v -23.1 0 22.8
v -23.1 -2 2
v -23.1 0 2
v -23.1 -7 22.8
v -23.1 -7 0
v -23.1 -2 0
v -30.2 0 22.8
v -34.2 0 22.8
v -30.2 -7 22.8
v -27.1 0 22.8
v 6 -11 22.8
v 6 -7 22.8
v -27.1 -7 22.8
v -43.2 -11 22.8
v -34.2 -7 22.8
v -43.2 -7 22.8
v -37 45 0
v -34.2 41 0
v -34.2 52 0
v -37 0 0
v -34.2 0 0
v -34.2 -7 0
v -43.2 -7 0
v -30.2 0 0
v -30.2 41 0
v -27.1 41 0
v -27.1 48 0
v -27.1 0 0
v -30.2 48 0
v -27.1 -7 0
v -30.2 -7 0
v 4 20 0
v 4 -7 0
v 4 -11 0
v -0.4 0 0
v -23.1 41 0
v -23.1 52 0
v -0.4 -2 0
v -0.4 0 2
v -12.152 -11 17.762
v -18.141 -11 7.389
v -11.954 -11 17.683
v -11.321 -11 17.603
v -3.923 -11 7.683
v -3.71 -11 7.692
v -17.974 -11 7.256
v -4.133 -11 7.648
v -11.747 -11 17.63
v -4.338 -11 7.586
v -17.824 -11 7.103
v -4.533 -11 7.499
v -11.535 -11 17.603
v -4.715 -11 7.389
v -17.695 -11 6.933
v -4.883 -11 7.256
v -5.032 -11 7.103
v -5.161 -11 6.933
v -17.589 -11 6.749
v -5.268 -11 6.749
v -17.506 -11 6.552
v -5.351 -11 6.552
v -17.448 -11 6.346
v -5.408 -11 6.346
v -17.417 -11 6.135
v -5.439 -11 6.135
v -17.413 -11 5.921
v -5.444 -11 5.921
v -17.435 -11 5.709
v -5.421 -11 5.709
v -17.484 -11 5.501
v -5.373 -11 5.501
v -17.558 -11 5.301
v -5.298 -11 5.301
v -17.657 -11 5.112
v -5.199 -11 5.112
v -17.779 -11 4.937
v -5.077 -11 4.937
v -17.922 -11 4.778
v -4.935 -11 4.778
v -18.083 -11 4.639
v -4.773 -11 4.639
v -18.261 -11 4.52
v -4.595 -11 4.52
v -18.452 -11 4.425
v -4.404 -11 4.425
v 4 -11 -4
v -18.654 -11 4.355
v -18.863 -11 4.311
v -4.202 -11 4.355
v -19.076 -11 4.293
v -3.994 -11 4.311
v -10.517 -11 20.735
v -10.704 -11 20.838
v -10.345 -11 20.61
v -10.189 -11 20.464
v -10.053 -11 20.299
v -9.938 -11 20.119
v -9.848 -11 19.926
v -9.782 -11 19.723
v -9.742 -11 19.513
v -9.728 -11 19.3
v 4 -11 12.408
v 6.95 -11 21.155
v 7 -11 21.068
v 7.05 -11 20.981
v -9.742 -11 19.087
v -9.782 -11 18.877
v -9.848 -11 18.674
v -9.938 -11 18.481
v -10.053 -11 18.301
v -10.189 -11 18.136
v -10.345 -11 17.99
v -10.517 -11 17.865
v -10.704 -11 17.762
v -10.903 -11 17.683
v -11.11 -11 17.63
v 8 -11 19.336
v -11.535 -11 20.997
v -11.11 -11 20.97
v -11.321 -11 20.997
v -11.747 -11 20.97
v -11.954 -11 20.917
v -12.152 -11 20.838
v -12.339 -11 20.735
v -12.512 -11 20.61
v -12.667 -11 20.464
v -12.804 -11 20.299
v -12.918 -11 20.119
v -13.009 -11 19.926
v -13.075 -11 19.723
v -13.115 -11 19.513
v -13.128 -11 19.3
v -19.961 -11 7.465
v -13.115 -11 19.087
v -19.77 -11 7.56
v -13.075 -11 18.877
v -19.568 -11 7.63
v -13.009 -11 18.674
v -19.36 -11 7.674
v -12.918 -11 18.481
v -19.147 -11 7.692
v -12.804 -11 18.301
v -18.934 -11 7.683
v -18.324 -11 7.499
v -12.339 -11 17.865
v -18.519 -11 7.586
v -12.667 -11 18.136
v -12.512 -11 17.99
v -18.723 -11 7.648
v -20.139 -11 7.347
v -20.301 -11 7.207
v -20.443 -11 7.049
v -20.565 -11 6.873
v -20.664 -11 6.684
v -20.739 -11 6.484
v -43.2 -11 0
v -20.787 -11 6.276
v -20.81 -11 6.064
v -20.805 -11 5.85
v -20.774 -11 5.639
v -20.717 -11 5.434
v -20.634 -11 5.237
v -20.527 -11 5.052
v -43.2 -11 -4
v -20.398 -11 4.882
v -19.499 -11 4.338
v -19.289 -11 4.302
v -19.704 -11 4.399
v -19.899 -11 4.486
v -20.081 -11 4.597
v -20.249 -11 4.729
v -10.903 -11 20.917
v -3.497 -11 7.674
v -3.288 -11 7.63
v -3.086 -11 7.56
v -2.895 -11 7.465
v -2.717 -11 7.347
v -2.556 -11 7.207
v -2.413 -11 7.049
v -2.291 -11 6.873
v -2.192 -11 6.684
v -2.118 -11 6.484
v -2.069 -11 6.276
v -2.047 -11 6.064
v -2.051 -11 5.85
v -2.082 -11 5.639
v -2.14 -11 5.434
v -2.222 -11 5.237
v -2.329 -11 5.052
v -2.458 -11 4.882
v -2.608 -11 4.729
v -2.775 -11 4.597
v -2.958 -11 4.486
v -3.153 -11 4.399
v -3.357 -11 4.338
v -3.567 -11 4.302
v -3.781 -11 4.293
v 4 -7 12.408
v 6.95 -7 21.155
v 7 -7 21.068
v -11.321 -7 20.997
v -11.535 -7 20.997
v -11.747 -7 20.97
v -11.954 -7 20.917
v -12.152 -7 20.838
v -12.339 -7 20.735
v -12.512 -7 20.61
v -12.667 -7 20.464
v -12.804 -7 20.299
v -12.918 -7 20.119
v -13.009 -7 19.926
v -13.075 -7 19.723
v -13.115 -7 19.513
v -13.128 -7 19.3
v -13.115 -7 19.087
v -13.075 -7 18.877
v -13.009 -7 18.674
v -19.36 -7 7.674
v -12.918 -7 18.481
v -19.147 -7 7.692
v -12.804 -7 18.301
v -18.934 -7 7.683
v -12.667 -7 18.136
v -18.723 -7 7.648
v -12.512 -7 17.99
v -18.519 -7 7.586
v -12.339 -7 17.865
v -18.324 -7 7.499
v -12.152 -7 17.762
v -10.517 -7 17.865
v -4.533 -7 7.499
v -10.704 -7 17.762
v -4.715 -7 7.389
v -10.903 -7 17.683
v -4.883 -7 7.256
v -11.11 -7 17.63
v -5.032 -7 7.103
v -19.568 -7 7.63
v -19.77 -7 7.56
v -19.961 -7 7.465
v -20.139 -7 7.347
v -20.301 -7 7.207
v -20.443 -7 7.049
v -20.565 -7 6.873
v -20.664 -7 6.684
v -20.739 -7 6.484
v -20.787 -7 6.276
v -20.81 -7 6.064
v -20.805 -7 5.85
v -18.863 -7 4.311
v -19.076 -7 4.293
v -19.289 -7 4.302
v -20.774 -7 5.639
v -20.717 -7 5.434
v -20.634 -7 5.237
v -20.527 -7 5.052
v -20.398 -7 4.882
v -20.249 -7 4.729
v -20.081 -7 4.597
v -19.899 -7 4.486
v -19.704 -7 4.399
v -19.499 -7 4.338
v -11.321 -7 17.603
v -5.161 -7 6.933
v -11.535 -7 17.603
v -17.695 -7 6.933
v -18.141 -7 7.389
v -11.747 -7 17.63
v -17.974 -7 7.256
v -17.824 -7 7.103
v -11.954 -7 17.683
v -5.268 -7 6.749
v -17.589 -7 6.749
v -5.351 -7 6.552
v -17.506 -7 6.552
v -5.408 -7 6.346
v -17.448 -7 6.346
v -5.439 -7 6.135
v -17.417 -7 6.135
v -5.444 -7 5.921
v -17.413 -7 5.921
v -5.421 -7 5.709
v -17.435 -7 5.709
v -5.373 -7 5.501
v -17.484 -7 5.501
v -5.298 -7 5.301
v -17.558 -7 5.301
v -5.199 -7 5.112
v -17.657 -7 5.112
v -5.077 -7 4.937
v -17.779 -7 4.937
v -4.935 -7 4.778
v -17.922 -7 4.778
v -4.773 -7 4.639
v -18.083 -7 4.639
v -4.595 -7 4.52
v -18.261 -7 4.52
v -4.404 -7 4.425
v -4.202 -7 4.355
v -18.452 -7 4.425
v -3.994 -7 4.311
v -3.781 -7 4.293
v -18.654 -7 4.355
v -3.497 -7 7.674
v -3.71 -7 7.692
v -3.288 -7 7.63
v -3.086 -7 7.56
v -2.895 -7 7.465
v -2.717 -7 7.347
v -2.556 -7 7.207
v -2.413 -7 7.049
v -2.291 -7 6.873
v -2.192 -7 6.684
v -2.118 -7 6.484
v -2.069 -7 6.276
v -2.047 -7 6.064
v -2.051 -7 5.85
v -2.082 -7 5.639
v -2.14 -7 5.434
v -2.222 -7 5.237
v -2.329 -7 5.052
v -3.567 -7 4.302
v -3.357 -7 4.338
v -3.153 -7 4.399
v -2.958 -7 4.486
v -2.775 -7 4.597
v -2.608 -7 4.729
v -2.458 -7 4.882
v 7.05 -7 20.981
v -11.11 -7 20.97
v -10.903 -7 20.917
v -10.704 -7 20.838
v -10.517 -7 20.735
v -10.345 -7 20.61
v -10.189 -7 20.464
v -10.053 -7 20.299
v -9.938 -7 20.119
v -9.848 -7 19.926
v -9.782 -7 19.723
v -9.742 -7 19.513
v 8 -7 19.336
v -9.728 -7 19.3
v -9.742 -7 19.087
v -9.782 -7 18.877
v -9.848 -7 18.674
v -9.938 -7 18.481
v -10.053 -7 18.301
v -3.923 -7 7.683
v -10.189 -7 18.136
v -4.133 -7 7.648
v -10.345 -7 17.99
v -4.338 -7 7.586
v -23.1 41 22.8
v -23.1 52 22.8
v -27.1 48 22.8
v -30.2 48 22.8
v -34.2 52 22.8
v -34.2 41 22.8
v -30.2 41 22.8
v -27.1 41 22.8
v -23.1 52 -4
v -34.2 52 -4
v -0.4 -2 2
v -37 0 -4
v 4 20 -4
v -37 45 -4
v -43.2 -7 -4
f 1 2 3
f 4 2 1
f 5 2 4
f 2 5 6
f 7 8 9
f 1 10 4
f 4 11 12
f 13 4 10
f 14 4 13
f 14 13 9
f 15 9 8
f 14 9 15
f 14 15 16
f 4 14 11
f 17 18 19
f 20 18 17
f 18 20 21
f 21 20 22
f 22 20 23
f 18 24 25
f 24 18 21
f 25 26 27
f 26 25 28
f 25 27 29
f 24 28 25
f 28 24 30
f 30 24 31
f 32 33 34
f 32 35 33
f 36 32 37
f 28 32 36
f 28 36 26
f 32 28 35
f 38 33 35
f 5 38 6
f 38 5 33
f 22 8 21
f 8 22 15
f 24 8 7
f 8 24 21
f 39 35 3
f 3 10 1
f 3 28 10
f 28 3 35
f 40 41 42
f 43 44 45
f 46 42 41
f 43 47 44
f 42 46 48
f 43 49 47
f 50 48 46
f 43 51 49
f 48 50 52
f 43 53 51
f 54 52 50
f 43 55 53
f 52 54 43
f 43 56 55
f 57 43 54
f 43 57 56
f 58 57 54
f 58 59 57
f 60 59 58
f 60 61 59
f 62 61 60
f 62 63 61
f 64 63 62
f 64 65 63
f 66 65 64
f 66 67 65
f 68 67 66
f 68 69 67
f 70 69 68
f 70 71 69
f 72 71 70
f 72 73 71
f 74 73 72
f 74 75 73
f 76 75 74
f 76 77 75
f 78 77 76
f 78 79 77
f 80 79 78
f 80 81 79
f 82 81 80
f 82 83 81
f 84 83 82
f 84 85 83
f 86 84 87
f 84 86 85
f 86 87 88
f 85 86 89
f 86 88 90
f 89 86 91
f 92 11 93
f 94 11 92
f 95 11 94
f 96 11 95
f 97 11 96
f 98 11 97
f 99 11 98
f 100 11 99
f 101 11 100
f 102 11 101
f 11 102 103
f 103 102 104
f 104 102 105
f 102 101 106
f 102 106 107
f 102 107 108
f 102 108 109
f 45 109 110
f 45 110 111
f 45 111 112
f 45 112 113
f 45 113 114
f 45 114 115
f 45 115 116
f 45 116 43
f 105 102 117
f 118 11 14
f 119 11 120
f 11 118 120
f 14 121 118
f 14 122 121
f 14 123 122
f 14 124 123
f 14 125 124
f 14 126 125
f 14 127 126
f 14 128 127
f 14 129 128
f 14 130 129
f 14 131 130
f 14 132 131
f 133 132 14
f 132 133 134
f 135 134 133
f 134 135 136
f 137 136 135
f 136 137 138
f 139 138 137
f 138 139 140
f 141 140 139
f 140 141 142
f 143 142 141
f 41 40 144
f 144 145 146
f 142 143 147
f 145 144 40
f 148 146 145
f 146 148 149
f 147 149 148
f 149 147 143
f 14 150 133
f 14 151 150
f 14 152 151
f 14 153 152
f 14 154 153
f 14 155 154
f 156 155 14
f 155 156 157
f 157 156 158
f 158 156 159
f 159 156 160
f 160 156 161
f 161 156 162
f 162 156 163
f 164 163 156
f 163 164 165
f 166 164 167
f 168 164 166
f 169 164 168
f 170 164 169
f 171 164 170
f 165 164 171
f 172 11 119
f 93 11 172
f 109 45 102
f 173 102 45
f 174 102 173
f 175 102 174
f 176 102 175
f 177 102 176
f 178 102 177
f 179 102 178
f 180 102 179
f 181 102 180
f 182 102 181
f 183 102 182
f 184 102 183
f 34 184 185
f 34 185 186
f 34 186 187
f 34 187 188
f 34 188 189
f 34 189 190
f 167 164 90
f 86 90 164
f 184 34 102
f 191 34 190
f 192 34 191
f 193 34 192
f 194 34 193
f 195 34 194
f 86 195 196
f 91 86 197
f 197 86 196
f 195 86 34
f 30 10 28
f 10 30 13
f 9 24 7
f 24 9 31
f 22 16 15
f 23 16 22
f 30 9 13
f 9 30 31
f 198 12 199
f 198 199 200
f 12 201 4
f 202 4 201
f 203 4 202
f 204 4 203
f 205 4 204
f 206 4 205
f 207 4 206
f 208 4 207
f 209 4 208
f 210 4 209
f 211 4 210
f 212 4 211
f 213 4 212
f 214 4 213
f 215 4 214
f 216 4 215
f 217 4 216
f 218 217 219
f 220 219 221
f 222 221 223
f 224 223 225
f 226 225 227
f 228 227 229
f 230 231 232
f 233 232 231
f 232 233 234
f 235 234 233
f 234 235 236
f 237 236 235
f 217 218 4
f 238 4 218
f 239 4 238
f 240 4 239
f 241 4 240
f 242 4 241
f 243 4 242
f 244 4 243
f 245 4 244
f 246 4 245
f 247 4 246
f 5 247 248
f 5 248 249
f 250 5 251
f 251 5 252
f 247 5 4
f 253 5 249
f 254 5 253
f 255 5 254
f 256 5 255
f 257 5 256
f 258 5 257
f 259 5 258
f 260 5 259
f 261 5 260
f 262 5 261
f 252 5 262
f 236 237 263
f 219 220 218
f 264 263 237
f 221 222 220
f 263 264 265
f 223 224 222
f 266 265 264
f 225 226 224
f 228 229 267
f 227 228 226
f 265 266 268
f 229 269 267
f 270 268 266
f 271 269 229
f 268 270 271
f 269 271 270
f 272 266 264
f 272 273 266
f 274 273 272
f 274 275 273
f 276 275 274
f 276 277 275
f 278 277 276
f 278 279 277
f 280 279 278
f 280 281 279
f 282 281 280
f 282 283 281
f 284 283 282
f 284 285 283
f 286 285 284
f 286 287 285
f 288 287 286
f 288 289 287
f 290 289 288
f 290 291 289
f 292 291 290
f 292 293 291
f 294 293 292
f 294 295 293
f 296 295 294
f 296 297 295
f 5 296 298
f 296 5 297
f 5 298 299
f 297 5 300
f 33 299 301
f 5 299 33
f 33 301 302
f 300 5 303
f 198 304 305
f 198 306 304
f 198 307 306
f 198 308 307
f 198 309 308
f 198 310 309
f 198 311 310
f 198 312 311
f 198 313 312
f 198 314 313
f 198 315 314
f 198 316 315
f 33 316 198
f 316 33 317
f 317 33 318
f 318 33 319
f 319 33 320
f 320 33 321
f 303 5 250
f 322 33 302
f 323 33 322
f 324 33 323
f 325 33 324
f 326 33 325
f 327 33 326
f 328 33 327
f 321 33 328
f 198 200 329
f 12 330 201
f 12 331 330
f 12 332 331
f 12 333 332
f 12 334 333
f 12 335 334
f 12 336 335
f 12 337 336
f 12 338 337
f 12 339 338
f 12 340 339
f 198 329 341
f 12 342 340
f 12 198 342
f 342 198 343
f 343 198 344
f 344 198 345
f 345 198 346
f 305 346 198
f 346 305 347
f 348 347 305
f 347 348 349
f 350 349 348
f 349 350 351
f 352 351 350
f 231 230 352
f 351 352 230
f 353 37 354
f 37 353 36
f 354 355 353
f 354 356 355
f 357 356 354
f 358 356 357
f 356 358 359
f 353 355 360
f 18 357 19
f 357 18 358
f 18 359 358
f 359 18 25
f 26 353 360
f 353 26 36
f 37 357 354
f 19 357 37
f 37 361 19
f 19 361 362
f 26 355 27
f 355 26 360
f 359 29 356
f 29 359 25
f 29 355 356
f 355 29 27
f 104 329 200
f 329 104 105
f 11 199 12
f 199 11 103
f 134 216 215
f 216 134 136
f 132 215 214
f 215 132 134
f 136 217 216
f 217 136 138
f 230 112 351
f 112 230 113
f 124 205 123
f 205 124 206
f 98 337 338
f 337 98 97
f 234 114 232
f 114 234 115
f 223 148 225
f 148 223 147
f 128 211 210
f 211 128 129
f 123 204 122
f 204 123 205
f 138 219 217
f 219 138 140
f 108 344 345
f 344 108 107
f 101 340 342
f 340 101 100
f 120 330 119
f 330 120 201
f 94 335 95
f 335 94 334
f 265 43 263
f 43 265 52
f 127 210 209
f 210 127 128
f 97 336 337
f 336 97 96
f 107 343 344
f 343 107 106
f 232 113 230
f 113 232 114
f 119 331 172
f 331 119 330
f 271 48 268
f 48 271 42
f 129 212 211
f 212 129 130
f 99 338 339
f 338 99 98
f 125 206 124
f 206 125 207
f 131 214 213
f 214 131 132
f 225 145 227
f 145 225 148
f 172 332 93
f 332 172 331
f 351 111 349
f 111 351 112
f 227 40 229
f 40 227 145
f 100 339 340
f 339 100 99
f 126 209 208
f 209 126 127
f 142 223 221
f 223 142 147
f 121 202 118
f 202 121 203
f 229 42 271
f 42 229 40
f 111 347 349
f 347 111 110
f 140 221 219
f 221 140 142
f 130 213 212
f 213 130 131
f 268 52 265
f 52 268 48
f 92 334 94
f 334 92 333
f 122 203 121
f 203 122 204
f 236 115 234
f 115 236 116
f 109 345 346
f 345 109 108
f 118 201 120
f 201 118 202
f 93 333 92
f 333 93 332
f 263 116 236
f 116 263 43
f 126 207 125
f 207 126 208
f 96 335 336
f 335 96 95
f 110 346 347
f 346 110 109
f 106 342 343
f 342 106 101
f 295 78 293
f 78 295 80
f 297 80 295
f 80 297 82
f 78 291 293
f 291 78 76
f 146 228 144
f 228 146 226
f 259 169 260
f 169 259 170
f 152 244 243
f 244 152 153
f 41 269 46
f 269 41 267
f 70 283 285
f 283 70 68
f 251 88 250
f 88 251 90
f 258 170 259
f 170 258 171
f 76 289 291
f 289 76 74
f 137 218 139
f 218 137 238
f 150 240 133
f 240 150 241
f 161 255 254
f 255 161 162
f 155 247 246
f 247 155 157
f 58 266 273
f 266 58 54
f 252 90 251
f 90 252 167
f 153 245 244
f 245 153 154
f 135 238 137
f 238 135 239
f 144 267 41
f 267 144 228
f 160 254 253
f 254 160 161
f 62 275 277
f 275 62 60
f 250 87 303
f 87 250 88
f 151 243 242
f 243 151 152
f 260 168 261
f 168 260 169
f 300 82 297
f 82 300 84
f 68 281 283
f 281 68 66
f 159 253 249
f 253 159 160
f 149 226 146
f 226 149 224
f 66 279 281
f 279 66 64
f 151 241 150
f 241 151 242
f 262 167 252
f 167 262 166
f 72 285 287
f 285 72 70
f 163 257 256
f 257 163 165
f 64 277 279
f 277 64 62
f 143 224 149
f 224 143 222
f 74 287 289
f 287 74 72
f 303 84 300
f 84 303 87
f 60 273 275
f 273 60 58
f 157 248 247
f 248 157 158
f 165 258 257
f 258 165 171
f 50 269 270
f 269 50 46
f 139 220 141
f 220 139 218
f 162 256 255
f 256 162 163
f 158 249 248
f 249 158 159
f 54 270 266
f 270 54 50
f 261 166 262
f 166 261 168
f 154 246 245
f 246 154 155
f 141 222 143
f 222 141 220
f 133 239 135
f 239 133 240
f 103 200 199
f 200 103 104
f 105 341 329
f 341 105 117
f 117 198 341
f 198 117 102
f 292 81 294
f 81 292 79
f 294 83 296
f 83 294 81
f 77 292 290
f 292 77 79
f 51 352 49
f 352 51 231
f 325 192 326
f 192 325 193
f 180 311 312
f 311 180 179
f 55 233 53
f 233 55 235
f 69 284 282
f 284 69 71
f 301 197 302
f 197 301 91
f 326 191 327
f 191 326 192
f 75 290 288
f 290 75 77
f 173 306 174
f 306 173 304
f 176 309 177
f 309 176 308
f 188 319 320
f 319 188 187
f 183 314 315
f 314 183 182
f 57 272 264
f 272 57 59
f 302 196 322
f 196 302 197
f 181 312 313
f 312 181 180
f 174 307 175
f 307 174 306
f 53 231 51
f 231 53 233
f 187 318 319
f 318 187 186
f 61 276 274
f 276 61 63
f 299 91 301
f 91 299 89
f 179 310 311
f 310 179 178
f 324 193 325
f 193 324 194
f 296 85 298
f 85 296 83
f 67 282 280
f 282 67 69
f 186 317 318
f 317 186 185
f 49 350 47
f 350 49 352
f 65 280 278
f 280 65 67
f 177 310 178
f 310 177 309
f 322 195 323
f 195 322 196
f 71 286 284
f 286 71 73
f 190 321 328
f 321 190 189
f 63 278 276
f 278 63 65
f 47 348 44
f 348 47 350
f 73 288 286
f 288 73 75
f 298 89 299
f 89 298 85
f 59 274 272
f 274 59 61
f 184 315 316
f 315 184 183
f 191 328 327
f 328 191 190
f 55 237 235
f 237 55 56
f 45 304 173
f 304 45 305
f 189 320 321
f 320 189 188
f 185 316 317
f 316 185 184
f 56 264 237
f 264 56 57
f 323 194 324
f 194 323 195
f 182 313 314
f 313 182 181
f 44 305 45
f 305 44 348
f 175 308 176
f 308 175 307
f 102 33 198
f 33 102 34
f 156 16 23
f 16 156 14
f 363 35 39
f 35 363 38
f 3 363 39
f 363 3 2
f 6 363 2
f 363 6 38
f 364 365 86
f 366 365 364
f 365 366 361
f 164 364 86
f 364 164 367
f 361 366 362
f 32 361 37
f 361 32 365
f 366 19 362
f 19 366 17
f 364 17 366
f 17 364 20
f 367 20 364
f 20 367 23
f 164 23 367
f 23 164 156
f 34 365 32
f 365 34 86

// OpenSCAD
// file: triangle_truss.scad
module truss_edge_beam(beam_width, edge_extrude, total_length)
{
  edge_width = beam_width * tan(60);
  edge_bevel = beam_width / (2 * cos(60));
  bevel_x = edge_bevel - (1 + $epsilon) * beam_width * cos(60) / 2;
  bevel_y = (1 + $epsilon) * beam_width * sin(60) / 2;
  linear_extrude(height = total_length)
  {
    polygon([[edge_bevel, 0], [edge_width + edge_extrude, 0],
        [edge_width + edge_extrude, beam_width + tan(30) * edge_extrude],
        [edge_width, beam_width], [bevel_x, bevel_y]]);
  }
  echo("Main bean height:", beam_width + tan(30) * edge_extrude, "mm");
}

module truss_main_beams(beam_width, edge_extrude, inner_width, total_length)
{
  edge_width = beam_width * tan(60);
  union()
  {
    truss_edge_beam(beam_width, edge_extrude, total_length);
    translate([2*(edge_width+edge_extrude) + inner_width, 0, 0])
    {
      mirror([1, 0, 0])
      {
        truss_edge_beam(beam_width, edge_extrude, total_length);
      }
    }
  }
}

module truss_end_triangle(beam_width, edge_extrude, inner_width, screw_d, screw_position)
{
  difference()
  {
    linear_extrude(height = beam_width)
    {
      polygon([[-$epsilon, 0], [inner_width + $epsilon, 0], [inner_width + $epsilon, beam_width],
               [inner_width + edge_extrude, beam_width],
               [inner_width/2, beam_width + sqrt(3)*(inner_width + 2*edge_extrude)/6 + $epsilon], 
               [-edge_extrude, beam_width], [-$epsilon, beam_width]]);
    }

    if (screw_position == 0)
    {
      translate([inner_width - (2 + screw_d/2), 2 + screw_d/2, -$epsilon])
      {
        cylinder(h=beam_width + 2*$epsilon, r=(screw_d/2 + $padding), center=false);
      }
    }
    else
    {
      translate([inner_width/2, 2 + screw_d/2, -$epsilon])
      {
        cylinder(h=beam_width + 2*$epsilon, r=(screw_d/2 + $padding), center=false);
      }
    }
  }
}

module truss_sweep(beam_width, edge_extrude, inner_width, num_inner_beams, inner_beam_angle, top)
{
  inner_beam_length = inner_width / tan(inner_beam_angle);
  inner_beam_offset = beam_width / sin(inner_beam_angle);
  total_length = beam_width + num_inner_beams*inner_beam_length +
                 inner_beam_offset + (num_inner_beams - 1)*inner_beam_offset/3;

  for (i = [0 : 1.0: num_inner_beams - 1])
  {
    translate([0, beam_width, beam_width/2 + i*(inner_beam_length+inner_beam_offset/3)])
    {
      union()
      {
        if (top == 1 && i > 0)
        {
          translate([-$epsilon, -beam_width, inner_beam_offset/3 - beam_width/2])
          cube([inner_width + 2*$epsilon, beam_width, beam_width]);
        }
        if (i % 2 == 0)
        {
          rotate([90, 0, 0])
          {
            linear_extrude(height=beam_width)
            {
              polygon([[-$epsilon, 0], [inner_width + $epsilon, inner_beam_length],
                       [inner_width + $epsilon, inner_beam_length + inner_beam_offset],
                       [-$epsilon, inner_beam_offset]]);
            }
          }
        }
        else
        {
          rotate([90, 0, 0])
          {
            linear_extrude(height=beam_width)
            {
              polygon([[inner_width + $epsilon, 0], [-$epsilon, inner_beam_length],
                       [-$epsilon, inner_beam_length + inner_beam_offset],
                       [inner_width + $epsilon, inner_beam_offset]]);
            }
          }
        }
      }
    }
  }
}

module triangle_truss_face(beam_width, edge_extrude, num_inner_beams, inner_beam_angle, inner_width, screw_d, screw_position, top)
{
  edge_width = beam_width * tan(60);
  inner_beam_length = inner_width / tan(inner_beam_angle);
  inner_beam_offset = beam_width / sin(inner_beam_angle);

  total_length = beam_width + num_inner_beams*inner_beam_length +
                 inner_beam_offset + (num_inner_beams - 1)*inner_beam_offset/3;
  union()
  {
    truss_main_beams(beam_width, edge_extrude, inner_width, total_length);

    translate([edge_width + edge_extrude, 0, 0])
    {
      union()
      {
        truss_end_triangle(beam_width, edge_extrude, inner_width, screw_d, screw_position);
        translate([0, 0, total_length - beam_width])
        {
          truss_end_triangle(beam_width, edge_extrude, inner_width, screw_d, screw_position);
        }

        truss_sweep(beam_width, edge_extrude, inner_width, num_inner_beams, inner_beam_angle, top);
      }
    }
  }
}

module triangle_truss(beam_width, edge_extrude, num_inner_beams, inner_beam_angle, inner_width, screw_d, screw_position)
{
  edge_width = beam_width * tan(60);
  total_width = 2*(edge_width+edge_extrude) + inner_width;

  union()
  {
    triangle_truss_face(beam_width, edge_extrude, num_inner_beams, inner_beam_angle, inner_width, screw_d, screw_position, 1);

    translate([total_width, 0, 0])
    {
      rotate([0, 0, 120])
      {
        triangle_truss_face(beam_width, edge_extrude, num_inner_beams, inner_beam_angle, inner_width, screw_d, screw_position, 1);
      }
    }

    rotate([0, 0, -120])
    {
      mirror([1, 0, 0])
      translate([0, 0, 0])
      {
        triangle_truss_face(beam_width, edge_extrude, num_inner_beams, inner_beam_angle, inner_width, screw_d, screw_position, 1);
      }
    }
  }
}

module triangle_truss_dims(beam_width, edge_extrude, num_inner_beams, inner_beam_angle, inner_width)
{
  inner_beam_length = inner_width / tan(inner_beam_angle);
  inner_beam_offset = beam_width / sin(inner_beam_angle);

  total_length = beam_width + num_inner_beams*inner_beam_length +
                 inner_beam_offset + (num_inner_beams - 1)*inner_beam_offset/3;

  edge_width = beam_width * tan(60);
  edge_bevel = beam_width / (2 * cos(60));
  bevel_x = edge_bevel - beam_width * cos(60);

  total_width = 2*(edge_width - edge_bevel + bevel_x) +
                2*edge_extrude + inner_width;

  echo("Truss length: ", total_length, " mm");
  echo("Truss width: ", total_width, " mm");
}
// file: bearing.scad
module bearing(dims)
{
  outer_r = dims[0];
  inner_r = dims[1];
  height  = dims[2];
  outer_w = dims[3];
  inner_w = dims[4];

  color("DarkGray")
  {
    union()
    {
      difference()
      {
        cylinder(h = height, r = outer_r);
        translate([0, 0, -$epsilon])
        {
          cylinder(h = height + 2*$epsilon, r = outer_r - outer_w);
        }
      }
      difference()
      {
        cylinder(h = height, r = inner_r + inner_w);
        translate([0, 0, -$epsilon])
        {
          cylinder(h = height + 2*$epsilon, r = inner_r);
        }
      }
    }
  }
}
// file: servo.scad
module _servo_mounting_ear(a, b, c, d, e, f)
{
	difference() {
		cube(size=[d, (e-b)/2, 2]);
		union() {
			translate([5, 3, -0.5]) {
				cylinder(r=2, h=3);
				translate([-1, -3.5, 0]) cube([2, 2, 3]);
			}
			translate([15, 3, -0.5]) {
				cylinder(r=2, h=3);
				translate([-1, -3.5, 0]) cube([2, 2, 3]);
			}
		}
	}
}

module servo(a, b, c, d, e, f, x) {
	translate([-d/2, -(x), -a])
	union() {
		// Axle
		color("Gold") {
			translate([d/2, x, c]) {
				difference() {
					union() {
						cylinder(r=3, h=a-c-0.5);
						translate([0, 0, a-c-0.5]) cylinder(r1=3, r2=2.5, 0.5);
					}
					union() {
						translate([0, 0, 2]) cylinder(r=1, h=a-c-0.5);
						translate([0, 0, a-c-0.51]) cylinder(r1=1, r2=1.5, 0.52);
					}
				}
			}
		}
		// Body
		color("DarkGray") {
			translate([d/2, x, c-1]) cylinder(h=2, r1=d/3, r2=d/4);
			cube(size=[d, b, c-1]);
			// Mounting brackets
			translate([0, -(e-b)/2, f]) {
				_servo_mounting_ear(a, b, c, d, e, f);
			}
			translate([0, b+(e-b)/2, f])
			mirror ([0, 1, 0]) {
				_servo_mounting_ear(a, b, c, d, e, f);
			}
		}
	}
}
// file: elbow_dimensions.scad
$fn = 50;
// All dimensions in millimeters (mm)

$epsilon = 0.05;
$padding = 0.2;
$padding2 = 2 * $padding;

servo_height = 20.4 + $padding2;
servo_width = 40.6 + $padding2;
servo_depth = 36.6 + $padding2;

servo_ear_width = 6.8 + $padding;
servo_ear_thickness = 2.7 + $padding2;
servo_ear_position = 26.9 + $padding;

servo_arm_position = 43 + $padding;
servo_arm_width = 21;

wall_thickness = 4;
wall_extrude = 2;
cord_size = [9.2, 3.8];

fork_thickness = wall_thickness;

// [outer radius, inner radius, height, outer ring thickness, inner ring thickness]
bearing_dims = [4.76+$padding2, 2.375-$padding, 3.15, 1.1, 1.1];

/*
[cone length, cone inner radius, cone outer radius
 axle length, axle inner radius, axle outer radius, nut diameter]
*/
axle_dims = [ 3, 8, 4,
             2*bearing_dims[2] + fork_thickness/3, 1.5+$padding, bearing_dims[1], 6.1];
axle_position = 10;

fork_axle_length = 5;
fork_axle_hole = 7;
fork_axle_aux_r = 7.85;
fork_axle_aux_hole = 1 + $padding2;

fork_width = 30;
fork_offset = 45;
fork_height = fork_axle_length + 2*fork_thickness + wall_thickness +
              servo_arm_position + axle_dims[0] + bearing_dims[2] - fork_thickness/3;
// main file
include <elbow_dimensions.scad>

use <elbow_servo_mount.scad>
use <servo.scad>
use <bearing.scad>

// Servo housing
translate([0, 0, -wall_thickness])
{
elbow_mount_base(servo_width, servo_depth, servo_ear_position, servo_ear_thickness,
                 servo_ear_width, servo_arm_position, axle_position,
                 wall_thickness, wall_thickness);
}
elbow_mount_walls(servo_width, servo_height, servo_depth, servo_ear_position,
                servo_ear_thickness, servo_ear_width, servo_arm_position,
                wall_thickness, wall_extrude);
